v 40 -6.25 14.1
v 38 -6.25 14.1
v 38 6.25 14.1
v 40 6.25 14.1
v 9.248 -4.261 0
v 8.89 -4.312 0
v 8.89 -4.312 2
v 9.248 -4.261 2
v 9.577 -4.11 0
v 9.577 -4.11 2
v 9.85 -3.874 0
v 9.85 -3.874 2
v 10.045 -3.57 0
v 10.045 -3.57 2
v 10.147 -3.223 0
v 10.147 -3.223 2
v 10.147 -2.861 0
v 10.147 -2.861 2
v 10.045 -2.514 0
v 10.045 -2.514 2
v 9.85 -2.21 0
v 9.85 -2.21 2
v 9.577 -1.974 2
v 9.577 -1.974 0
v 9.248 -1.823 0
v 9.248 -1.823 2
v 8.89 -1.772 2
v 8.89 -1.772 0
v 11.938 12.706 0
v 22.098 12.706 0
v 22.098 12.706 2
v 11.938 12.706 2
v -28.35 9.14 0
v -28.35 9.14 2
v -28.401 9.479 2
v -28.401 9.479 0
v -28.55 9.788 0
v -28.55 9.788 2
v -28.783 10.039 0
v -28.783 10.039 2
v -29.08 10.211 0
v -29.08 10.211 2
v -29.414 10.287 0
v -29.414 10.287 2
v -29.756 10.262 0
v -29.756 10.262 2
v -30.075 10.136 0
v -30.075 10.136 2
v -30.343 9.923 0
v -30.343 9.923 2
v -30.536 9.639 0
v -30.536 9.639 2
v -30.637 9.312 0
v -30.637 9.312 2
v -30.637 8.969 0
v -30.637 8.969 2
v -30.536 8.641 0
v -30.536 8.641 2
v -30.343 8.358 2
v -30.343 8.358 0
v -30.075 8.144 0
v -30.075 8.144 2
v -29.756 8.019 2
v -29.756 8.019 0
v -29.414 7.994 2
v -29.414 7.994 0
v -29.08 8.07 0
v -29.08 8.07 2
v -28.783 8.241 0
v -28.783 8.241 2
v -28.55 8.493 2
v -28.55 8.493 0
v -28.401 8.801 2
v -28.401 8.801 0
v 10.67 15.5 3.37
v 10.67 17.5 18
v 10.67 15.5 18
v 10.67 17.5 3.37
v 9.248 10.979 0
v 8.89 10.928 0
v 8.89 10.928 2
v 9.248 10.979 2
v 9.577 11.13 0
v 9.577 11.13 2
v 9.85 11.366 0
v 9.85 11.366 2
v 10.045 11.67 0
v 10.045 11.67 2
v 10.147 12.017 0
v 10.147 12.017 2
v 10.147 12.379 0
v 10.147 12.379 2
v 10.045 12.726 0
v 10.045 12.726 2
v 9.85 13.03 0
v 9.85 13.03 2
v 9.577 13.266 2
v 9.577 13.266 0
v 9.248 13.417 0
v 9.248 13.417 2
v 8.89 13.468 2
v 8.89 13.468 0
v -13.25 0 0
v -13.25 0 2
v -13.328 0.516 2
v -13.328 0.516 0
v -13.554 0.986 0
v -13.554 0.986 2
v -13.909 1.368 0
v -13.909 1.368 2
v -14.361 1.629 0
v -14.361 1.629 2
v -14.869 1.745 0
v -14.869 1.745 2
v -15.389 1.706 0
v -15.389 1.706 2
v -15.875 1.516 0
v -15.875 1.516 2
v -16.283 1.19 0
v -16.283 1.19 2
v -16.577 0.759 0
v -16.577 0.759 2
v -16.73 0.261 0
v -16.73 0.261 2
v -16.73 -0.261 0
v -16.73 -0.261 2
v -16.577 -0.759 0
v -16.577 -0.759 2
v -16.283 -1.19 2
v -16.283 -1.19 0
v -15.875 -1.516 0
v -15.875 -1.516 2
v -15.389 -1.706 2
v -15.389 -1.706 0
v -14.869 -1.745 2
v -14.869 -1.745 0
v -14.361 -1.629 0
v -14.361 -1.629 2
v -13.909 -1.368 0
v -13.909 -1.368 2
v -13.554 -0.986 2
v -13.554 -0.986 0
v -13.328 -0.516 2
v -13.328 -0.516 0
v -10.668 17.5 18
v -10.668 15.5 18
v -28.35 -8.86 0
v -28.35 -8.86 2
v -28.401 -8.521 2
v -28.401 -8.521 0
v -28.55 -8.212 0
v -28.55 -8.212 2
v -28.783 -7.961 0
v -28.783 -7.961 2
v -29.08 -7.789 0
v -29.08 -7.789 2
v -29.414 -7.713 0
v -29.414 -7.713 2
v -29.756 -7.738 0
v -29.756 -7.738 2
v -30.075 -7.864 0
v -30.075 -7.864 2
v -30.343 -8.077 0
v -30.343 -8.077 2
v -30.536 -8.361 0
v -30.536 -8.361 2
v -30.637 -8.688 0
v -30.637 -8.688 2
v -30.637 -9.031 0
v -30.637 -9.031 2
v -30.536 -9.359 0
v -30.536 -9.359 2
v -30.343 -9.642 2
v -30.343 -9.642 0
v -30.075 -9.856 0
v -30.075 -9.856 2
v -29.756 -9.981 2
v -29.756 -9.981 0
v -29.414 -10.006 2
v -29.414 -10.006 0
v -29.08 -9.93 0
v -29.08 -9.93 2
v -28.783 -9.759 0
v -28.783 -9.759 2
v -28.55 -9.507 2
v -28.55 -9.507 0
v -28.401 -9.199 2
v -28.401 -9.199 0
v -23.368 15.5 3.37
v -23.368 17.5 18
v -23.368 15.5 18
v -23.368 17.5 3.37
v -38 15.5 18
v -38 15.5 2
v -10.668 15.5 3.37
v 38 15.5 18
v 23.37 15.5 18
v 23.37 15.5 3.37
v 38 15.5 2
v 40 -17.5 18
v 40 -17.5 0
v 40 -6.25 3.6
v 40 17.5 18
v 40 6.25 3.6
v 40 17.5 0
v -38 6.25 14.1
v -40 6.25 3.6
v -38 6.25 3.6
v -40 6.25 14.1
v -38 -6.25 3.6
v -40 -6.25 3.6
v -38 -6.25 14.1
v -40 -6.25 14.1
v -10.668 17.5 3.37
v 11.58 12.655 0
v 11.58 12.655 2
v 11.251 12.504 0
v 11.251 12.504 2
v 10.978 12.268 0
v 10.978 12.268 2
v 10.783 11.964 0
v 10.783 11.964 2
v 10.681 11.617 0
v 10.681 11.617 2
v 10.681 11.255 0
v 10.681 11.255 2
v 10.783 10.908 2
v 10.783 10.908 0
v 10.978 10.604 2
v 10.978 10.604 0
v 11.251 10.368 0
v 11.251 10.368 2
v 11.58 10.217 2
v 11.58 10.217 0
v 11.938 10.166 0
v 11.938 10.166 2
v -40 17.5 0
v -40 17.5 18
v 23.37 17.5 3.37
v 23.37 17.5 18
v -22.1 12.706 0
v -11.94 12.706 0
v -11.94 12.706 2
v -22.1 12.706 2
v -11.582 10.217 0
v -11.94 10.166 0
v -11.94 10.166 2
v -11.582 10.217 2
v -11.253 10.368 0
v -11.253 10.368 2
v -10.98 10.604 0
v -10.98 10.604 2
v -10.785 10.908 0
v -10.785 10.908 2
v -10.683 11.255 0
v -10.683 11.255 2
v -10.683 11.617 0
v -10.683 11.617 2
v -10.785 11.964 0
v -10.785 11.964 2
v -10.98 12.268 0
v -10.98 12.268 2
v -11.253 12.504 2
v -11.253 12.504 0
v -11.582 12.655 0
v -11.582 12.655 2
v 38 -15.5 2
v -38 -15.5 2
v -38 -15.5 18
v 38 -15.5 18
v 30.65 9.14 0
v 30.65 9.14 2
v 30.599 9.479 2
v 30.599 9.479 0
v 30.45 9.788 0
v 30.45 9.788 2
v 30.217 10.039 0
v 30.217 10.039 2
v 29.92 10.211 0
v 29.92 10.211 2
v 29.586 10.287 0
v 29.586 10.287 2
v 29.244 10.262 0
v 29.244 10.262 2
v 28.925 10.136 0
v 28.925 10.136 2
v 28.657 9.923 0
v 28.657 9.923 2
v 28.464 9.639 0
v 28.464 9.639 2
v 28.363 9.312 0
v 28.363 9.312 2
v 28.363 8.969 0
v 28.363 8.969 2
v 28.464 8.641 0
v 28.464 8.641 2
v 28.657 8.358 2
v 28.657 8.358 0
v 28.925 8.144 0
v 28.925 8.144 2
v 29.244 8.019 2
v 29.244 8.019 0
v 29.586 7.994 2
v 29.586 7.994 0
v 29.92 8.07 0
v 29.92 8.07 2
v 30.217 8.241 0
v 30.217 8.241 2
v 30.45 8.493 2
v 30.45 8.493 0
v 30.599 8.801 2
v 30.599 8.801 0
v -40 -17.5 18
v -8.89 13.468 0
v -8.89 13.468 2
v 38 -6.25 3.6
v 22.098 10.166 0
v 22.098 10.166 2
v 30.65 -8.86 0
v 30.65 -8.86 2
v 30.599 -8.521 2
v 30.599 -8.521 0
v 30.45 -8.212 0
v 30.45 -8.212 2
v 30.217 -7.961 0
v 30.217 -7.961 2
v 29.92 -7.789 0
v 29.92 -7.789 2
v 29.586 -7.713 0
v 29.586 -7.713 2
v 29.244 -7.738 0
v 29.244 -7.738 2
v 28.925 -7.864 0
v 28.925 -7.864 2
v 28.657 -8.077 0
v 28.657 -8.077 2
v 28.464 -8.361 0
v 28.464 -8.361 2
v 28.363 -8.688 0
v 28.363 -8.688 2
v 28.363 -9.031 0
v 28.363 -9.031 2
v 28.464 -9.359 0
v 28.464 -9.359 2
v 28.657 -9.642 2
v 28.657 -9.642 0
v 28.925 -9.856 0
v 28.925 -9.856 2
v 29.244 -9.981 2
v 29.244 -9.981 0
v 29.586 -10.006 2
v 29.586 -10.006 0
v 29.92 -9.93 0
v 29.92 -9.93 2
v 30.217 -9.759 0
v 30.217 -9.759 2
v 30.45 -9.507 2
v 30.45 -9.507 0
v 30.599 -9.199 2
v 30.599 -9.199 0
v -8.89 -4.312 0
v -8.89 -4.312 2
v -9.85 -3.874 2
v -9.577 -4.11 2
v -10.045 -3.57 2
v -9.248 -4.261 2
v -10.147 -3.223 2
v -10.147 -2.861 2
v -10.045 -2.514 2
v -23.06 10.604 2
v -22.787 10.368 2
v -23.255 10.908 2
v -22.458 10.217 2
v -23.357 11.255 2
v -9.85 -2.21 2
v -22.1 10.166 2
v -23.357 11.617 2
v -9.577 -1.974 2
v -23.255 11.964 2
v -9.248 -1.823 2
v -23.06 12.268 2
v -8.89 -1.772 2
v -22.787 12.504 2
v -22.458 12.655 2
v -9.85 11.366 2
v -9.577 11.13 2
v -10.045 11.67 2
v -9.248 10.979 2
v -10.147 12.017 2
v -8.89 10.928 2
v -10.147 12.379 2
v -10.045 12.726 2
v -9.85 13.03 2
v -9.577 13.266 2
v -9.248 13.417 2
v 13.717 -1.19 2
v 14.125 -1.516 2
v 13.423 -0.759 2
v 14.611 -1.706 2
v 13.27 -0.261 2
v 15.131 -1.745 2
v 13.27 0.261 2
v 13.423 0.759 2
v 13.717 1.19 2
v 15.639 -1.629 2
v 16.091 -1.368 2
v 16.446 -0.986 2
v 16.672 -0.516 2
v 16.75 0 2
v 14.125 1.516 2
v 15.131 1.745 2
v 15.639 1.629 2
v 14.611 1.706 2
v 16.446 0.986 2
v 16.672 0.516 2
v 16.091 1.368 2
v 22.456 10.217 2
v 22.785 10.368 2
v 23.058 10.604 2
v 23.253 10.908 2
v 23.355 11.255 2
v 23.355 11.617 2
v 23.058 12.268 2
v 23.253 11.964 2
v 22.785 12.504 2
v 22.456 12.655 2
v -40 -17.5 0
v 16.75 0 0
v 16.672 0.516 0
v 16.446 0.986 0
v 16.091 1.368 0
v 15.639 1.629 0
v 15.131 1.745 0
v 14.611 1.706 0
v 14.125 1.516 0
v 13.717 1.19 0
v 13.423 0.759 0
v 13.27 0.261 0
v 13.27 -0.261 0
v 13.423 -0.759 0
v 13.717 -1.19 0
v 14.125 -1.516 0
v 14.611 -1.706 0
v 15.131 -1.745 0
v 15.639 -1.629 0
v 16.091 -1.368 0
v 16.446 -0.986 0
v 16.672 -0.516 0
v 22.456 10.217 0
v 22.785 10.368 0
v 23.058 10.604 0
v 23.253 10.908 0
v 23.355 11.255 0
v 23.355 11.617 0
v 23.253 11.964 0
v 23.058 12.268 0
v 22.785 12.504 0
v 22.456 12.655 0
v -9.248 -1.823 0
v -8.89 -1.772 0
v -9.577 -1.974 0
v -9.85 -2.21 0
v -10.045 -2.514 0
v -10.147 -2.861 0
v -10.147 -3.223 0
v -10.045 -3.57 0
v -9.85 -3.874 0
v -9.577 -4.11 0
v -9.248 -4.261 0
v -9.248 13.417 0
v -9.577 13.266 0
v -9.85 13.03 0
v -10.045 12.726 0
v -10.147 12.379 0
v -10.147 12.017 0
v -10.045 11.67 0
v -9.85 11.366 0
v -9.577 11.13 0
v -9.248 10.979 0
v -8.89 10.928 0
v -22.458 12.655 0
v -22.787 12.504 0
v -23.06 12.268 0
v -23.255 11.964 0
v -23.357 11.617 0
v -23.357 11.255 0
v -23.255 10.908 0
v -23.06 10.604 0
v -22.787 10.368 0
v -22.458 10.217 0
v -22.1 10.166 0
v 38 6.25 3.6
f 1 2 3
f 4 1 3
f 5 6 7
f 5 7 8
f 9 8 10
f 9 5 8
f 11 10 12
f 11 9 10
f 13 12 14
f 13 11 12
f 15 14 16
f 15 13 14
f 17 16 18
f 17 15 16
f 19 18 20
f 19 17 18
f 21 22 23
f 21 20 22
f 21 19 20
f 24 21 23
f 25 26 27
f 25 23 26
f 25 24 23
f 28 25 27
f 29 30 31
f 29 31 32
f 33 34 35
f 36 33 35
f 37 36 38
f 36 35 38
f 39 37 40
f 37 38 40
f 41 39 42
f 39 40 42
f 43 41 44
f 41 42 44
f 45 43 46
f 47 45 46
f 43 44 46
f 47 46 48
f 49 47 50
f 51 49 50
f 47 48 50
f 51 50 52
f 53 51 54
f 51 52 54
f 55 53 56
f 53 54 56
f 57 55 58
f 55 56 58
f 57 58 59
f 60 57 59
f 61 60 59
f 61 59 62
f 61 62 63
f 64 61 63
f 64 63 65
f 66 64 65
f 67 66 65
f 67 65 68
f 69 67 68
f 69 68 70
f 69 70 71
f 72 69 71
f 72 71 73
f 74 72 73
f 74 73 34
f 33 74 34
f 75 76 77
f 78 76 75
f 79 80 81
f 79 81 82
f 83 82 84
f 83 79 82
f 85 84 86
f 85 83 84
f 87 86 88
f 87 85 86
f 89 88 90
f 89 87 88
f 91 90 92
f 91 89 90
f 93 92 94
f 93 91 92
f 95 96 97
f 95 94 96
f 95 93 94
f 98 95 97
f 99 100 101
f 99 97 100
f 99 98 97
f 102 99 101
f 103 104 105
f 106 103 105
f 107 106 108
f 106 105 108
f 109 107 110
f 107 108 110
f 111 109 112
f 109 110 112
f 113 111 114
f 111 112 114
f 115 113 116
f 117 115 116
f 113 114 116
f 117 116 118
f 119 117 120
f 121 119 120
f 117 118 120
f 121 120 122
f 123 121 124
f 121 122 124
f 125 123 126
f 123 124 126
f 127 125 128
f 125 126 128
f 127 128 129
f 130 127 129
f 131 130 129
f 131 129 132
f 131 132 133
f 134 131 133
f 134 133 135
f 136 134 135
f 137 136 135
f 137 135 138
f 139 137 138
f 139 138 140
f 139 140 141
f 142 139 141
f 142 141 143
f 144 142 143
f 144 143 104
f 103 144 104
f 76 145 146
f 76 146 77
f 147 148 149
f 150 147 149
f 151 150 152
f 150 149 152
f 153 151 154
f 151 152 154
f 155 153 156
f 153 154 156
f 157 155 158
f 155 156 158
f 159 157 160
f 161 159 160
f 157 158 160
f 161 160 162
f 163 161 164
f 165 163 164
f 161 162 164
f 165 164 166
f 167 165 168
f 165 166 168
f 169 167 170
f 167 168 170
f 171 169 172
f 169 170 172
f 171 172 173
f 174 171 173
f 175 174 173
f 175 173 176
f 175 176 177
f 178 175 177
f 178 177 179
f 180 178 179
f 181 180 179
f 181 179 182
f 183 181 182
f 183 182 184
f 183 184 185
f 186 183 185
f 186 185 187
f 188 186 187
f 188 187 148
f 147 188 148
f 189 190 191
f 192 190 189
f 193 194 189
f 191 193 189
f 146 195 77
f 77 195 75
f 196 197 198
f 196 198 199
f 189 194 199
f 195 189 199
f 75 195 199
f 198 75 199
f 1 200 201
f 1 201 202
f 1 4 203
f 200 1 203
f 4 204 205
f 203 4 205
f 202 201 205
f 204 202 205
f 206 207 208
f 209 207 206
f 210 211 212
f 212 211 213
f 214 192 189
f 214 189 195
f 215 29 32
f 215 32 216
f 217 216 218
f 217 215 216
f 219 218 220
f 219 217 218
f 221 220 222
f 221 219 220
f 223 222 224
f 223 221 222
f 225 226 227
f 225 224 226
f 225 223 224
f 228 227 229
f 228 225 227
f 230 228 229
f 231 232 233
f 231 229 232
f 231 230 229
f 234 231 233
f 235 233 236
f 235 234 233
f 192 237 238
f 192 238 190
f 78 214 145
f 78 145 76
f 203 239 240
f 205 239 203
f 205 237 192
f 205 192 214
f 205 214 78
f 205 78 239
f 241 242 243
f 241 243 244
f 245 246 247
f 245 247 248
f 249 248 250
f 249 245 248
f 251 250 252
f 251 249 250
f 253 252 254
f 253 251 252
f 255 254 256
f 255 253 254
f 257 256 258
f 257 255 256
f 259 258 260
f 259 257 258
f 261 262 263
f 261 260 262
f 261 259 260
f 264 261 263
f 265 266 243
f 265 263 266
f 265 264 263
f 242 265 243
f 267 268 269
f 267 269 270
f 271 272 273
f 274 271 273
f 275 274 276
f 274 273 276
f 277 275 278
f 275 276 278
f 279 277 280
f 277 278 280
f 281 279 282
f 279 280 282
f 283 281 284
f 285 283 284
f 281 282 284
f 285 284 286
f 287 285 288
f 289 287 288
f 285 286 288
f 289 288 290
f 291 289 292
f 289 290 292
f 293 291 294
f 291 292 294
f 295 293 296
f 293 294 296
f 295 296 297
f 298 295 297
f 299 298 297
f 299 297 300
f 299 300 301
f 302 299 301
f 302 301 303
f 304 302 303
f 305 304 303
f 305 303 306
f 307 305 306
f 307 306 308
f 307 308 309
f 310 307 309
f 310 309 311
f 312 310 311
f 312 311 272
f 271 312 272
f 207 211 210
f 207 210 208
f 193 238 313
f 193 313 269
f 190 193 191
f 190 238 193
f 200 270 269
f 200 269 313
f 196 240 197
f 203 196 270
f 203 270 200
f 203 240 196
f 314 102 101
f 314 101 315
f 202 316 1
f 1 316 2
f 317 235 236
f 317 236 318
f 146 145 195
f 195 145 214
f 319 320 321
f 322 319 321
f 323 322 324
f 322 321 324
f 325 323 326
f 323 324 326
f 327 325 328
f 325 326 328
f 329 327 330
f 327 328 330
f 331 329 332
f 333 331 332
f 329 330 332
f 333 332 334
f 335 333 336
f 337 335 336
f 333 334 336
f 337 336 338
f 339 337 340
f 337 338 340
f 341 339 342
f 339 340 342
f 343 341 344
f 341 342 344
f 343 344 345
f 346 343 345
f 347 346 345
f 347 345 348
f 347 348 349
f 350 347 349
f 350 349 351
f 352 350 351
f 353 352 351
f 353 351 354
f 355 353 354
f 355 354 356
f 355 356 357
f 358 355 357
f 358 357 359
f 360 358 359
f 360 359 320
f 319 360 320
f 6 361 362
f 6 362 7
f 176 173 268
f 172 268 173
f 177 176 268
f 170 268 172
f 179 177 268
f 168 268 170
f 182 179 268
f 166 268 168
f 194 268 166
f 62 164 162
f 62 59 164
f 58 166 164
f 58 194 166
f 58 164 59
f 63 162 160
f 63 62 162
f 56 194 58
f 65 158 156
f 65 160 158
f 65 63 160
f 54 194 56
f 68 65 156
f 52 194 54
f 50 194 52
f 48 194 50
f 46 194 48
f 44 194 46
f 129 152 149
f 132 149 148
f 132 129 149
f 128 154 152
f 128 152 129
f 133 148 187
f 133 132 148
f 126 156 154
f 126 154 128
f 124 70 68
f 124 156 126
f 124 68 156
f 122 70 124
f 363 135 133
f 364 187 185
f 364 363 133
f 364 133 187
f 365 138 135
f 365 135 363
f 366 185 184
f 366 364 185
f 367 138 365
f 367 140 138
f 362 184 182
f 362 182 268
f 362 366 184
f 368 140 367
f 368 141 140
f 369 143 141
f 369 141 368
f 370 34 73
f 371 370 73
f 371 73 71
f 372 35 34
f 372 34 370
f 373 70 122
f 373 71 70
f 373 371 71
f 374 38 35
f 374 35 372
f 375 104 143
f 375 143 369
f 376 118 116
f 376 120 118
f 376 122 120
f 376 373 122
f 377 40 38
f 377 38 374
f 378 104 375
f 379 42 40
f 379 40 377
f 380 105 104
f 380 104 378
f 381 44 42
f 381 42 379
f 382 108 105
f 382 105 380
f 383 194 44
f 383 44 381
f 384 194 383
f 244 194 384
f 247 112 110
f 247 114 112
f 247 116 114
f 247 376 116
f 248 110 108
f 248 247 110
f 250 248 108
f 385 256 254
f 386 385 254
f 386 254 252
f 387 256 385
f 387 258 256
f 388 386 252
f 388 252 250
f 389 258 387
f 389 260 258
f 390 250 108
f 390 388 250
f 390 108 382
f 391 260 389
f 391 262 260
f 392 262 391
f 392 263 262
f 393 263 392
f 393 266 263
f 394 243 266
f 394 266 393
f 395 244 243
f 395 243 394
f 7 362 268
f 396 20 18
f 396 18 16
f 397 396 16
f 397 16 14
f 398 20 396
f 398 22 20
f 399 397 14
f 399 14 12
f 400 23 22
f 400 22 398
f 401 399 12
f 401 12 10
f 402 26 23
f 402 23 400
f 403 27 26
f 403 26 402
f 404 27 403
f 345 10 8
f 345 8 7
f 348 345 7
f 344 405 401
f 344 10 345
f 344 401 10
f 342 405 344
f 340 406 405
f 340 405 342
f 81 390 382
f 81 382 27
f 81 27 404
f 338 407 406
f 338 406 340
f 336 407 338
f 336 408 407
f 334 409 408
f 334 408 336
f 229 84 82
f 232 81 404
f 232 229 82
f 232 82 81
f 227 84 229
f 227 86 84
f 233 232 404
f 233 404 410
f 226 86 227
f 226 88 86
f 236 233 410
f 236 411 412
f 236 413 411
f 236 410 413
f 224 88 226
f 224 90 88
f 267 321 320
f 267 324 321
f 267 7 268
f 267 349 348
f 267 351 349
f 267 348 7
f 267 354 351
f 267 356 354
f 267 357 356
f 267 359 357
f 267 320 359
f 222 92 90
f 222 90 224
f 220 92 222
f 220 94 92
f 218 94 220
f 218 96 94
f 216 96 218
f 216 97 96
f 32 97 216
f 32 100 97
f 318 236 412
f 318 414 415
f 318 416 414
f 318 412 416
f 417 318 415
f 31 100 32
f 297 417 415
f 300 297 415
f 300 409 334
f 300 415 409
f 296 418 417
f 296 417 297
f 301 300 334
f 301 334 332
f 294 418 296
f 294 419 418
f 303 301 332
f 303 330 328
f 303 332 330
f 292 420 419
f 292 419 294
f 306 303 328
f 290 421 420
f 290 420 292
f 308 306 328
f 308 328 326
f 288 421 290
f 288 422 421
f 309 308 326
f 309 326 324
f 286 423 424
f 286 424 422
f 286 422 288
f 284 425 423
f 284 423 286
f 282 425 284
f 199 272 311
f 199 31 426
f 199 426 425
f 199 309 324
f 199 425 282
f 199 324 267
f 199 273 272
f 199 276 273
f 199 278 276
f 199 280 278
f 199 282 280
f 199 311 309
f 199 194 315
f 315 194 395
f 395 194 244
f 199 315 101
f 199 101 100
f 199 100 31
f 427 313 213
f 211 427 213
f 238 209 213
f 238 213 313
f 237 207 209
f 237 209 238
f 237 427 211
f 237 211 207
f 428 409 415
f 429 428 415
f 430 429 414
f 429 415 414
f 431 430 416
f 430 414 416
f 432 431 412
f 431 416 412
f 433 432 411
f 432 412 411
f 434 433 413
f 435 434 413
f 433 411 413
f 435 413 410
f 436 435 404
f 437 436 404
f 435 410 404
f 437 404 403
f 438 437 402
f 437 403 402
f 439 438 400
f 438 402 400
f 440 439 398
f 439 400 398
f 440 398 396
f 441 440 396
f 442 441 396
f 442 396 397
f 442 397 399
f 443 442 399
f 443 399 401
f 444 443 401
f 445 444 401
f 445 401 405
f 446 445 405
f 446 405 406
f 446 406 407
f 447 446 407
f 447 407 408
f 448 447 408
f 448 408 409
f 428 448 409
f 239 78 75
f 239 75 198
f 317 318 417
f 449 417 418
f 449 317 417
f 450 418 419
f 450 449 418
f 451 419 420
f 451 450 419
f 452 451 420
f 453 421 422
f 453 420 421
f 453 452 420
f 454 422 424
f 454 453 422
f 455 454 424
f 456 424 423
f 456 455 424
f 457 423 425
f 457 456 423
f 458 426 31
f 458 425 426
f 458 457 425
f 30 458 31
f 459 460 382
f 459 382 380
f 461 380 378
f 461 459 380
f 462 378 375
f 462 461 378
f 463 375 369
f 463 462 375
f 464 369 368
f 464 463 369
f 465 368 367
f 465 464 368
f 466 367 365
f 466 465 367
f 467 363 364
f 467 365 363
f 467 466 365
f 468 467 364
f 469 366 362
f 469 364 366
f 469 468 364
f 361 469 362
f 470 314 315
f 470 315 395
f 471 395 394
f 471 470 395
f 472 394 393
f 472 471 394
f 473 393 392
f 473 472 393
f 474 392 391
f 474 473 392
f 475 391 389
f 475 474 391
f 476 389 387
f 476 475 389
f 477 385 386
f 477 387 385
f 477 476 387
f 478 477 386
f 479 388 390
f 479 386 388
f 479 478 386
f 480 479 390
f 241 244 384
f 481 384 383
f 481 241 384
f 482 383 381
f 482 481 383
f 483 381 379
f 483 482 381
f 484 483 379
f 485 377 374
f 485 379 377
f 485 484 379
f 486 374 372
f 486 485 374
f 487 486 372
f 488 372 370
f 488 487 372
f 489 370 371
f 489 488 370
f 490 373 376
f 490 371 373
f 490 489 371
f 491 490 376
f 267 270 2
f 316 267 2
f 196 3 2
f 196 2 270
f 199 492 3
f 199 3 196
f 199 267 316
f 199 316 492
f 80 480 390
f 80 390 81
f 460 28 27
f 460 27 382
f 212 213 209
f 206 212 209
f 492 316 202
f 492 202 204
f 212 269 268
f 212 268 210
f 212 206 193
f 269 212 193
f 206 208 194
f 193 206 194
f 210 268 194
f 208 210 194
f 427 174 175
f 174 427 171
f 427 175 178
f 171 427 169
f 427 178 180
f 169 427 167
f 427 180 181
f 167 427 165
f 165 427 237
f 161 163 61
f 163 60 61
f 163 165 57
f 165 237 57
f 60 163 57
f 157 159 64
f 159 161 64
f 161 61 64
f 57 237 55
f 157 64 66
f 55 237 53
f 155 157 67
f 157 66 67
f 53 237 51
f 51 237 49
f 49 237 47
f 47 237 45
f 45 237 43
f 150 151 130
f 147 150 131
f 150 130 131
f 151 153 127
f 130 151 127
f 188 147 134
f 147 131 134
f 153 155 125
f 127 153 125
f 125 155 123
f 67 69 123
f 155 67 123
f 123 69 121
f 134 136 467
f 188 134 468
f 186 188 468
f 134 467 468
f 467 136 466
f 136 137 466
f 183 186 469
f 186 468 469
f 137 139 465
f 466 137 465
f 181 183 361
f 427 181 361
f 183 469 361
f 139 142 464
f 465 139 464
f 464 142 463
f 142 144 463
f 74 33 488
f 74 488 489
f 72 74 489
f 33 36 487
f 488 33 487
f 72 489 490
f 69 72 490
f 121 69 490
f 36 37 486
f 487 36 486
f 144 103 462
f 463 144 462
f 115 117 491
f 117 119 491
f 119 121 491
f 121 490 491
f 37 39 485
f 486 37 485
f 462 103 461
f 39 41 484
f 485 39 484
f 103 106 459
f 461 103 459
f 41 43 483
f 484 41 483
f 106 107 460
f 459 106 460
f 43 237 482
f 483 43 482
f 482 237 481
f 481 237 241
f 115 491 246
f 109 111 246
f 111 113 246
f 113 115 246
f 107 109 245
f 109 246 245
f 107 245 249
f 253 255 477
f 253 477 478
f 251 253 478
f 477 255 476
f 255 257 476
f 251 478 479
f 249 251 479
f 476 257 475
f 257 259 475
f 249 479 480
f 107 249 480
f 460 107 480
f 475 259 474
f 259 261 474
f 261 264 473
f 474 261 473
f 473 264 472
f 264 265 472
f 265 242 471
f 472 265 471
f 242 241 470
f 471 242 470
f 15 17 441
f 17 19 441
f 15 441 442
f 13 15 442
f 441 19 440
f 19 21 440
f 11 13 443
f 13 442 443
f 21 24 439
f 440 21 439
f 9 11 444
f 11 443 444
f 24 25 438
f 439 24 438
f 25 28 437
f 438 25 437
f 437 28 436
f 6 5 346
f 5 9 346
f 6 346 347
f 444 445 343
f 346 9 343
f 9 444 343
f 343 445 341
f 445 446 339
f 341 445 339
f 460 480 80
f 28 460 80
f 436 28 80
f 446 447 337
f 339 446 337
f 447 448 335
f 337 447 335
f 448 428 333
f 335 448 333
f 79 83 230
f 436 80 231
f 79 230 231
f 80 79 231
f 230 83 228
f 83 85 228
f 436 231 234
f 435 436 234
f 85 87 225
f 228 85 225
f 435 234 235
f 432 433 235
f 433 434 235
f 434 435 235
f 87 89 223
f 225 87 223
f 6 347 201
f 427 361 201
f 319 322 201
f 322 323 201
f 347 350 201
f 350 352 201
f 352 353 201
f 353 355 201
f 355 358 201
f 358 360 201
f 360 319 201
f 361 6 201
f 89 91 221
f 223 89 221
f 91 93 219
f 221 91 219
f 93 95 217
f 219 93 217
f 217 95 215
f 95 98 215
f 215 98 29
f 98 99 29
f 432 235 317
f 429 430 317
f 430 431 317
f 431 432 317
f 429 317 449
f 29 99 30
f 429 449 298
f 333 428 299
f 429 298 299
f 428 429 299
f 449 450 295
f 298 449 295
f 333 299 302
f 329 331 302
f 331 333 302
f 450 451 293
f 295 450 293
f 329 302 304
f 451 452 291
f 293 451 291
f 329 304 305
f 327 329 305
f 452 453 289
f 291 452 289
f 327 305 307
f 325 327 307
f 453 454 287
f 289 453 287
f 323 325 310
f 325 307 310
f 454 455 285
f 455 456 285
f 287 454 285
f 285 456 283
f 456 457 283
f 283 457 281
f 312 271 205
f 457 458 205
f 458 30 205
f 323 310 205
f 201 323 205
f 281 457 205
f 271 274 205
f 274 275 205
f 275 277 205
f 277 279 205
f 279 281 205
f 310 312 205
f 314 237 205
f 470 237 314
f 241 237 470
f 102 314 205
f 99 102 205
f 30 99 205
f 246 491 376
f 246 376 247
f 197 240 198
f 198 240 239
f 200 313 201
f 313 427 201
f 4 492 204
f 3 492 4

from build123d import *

# Parameters (mm, degrees)
SKETCH_1_W          = 80
SKETCH_1_H          = 35
EXTRUDE_1_DEPTH     = 2
SKETCH_2_W          = 80
SKETCH_2_H          = 35
SKETCH_2_W_2        = 76
SKETCH_2_H_2        = 31
EXTRUDE_2_DEPTH     = 16
SKETCH_3_W          = 10.5
SKETCH_3_H          = 12.5
CUT_EXTRUDE_1_DEPTH = 81
SKETCH_4_R          = 1.15
SKETCH_4_R_2        = 1.75
CUT_EXTRUDE_2_DEPTH = 3
CUT_EXTRUDE_3_DEPTH = 19
CUT_EXTRUDE_4_REACH = 37
SKETCH_6_W          = 12.7
SKETCH_6_H          = 3
CUT_EXTRUDE_5_REACH = 37
SKETCH_7_W          = 12.7
SKETCH_7_H          = 11.63


with BuildPart() as part:
    # 草图1 → 凸台-拉伸1 (new body)
    with BuildSketch(Plane.XY):
        Rectangle(SKETCH_1_W, SKETCH_1_H)
    extrude(amount=EXTRUDE_1_DEPTH)

    # 草图2 → 凸台-拉伸2 (add)
    with BuildSketch(Plane.XY.offset(2)):
        Rectangle(SKETCH_2_W, SKETCH_2_H)
        Rectangle(SKETCH_2_W_2, SKETCH_2_H_2, mode=Mode.SUBTRACT)
    extrude(amount=EXTRUDE_2_DEPTH)

    # 草图3 → 切除-拉伸1 (cut, through all)
    with BuildSketch(Plane.ZY.offset(40)):
        with Locations((8.85, 0)):
            Rectangle(SKETCH_3_W, SKETCH_3_H)
    extrude(amount=-CUT_EXTRUDE_1_DEPTH, mode=Mode.SUBTRACT)

    # 草图4 → 切除-拉伸2 (cut, through all)
    with BuildSketch(Plane.XY.offset(2)):
        with Locations((-29.5, 9.140333749)):
            Circle(SKETCH_4_R)
        with Locations((-29.5, -8.859666251)):
            Circle(SKETCH_4_R)
        with Locations((29.5, 9.140333749)):
            Circle(SKETCH_4_R)
        with Locations((29.5, -8.859666251)):
            Circle(SKETCH_4_R)
        with Locations((-15, 0)):
            Circle(SKETCH_4_R_2)
        with Locations((15, 0)):
            Circle(SKETCH_4_R_2)
    extrude(amount=-CUT_EXTRUDE_2_DEPTH, mode=Mode.SUBTRACT)

    # 草图5 → 切除-拉伸3 (cut, through all)
    with BuildSketch(Plane(origin=(0, 0, 0), x_dir=(-1, 0, 0), z_dir=(0, 0, -1))):
        with BuildLine():
            Line((-8.89, 13.468), (8.89, 13.468))
            ThreePointArc((8.89, 13.468), (10.16, 12.198), (8.89, 10.928))
            Line((8.89, 10.928), (-8.89, 10.928))
            ThreePointArc((-8.89, 10.928), (-10.16, 12.198), (-8.89, 13.468))
        make_face()
        with BuildLine():
            Line((-8.89, -1.772), (8.89, -1.772))
            ThreePointArc((8.89, -1.772), (10.16, -3.042), (8.89, -4.312))
            Line((8.89, -4.312), (-8.89, -4.312))
            ThreePointArc((-8.89, -4.312), (-10.16, -3.042), (-8.89, -1.772))
        make_face()
        with BuildLine():
            Line((-22.098, 12.706), (-11.938, 12.706))
            ThreePointArc((-11.938, 12.706), (-10.668, 11.436), (-11.938, 10.166))
            Line((-11.938, 10.166), (-22.098, 10.166))
            ThreePointArc((-22.098, 10.166), (-23.368, 11.436), (-22.098, 12.706))
        make_face()
        with BuildLine():
            Line((11.94, 12.706), (22.1, 12.706))
            ThreePointArc((22.1, 12.706), (23.37, 11.436), (22.1, 10.166))
            Line((22.1, 10.166), (11.94, 10.166))
            ThreePointArc((11.94, 10.166), (10.67, 11.436), (11.94, 12.706))
        make_face()
    extrude(amount=-CUT_EXTRUDE_3_DEPTH, mode=Mode.SUBTRACT)

    # 草图6 → 切除-拉伸4 (cut, up to next)
    with BuildSketch(Plane(origin=(0, 17.5, 0), x_dir=(1, 0, 0), z_dir=(0, 1, 0)), mode=Mode.PRIVATE) as cut_extrude_4_sk1:
        with Locations((-17.018, -4.87)):
            Rectangle(SKETCH_6_W, SKETCH_6_H)
    cut_extrude_4_tool1 = extrude(cut_extrude_4_sk1.sketch, amount=-CUT_EXTRUDE_4_REACH, mode=Mode.PRIVATE) & part.part
    add(cut_extrude_4_tool1.solids().sort_by_distance((-17.018, 17.5, 4.87))[0], mode=Mode.SUBTRACT)
    # 草图6 → 切除-拉伸4 (cut, up to next)
    with BuildSketch(Plane(origin=(0, 17.5, 0), x_dir=(1, 0, 0), z_dir=(0, 1, 0)), mode=Mode.PRIVATE) as cut_extrude_4_sk2:
        with Locations((17.02, -4.87)):
            Rectangle(SKETCH_6_W, SKETCH_6_H)
    cut_extrude_4_tool2 = extrude(cut_extrude_4_sk2.sketch, amount=-CUT_EXTRUDE_4_REACH, mode=Mode.PRIVATE) & part.part
    add(cut_extrude_4_tool2.solids().sort_by_distance((17.02, 17.5, 4.87))[0], mode=Mode.SUBTRACT)

    # 草图7 → 切除-拉伸5 (cut, up to next)
    with BuildSketch(Plane(origin=(0, 17.5, 0), x_dir=(1, 0, 0), z_dir=(0, 1, 0)), mode=Mode.PRIVATE) as cut_extrude_5_sk1:
        with Locations((-17.018, -12.185)):
            Rectangle(SKETCH_7_W, SKETCH_7_H)
    cut_extrude_5_tool1 = extrude(cut_extrude_5_sk1.sketch, amount=-CUT_EXTRUDE_5_REACH, mode=Mode.PRIVATE) & part.part
    add(cut_extrude_5_tool1.solids().sort_by_distance((-17.018, 17.5, 12.185))[0], mode=Mode.SUBTRACT)
    # 草图7 → 切除-拉伸5 (cut, up to next)
    with BuildSketch(Plane(origin=(0, 17.5, 0), x_dir=(1, 0, 0), z_dir=(0, 1, 0)), mode=Mode.PRIVATE) as cut_extrude_5_sk2:
        with Locations((17.02, -12.185)):
            Rectangle(SKETCH_7_W, SKETCH_7_H)
    cut_extrude_5_tool2 = extrude(cut_extrude_5_sk2.sketch, amount=-CUT_EXTRUDE_5_REACH, mode=Mode.PRIVATE) & part.part
    add(cut_extrude_5_tool2.solids().sort_by_distance((17.02, 17.5, 12.185))[0], mode=Mode.SUBTRACT)


solid = part.part
